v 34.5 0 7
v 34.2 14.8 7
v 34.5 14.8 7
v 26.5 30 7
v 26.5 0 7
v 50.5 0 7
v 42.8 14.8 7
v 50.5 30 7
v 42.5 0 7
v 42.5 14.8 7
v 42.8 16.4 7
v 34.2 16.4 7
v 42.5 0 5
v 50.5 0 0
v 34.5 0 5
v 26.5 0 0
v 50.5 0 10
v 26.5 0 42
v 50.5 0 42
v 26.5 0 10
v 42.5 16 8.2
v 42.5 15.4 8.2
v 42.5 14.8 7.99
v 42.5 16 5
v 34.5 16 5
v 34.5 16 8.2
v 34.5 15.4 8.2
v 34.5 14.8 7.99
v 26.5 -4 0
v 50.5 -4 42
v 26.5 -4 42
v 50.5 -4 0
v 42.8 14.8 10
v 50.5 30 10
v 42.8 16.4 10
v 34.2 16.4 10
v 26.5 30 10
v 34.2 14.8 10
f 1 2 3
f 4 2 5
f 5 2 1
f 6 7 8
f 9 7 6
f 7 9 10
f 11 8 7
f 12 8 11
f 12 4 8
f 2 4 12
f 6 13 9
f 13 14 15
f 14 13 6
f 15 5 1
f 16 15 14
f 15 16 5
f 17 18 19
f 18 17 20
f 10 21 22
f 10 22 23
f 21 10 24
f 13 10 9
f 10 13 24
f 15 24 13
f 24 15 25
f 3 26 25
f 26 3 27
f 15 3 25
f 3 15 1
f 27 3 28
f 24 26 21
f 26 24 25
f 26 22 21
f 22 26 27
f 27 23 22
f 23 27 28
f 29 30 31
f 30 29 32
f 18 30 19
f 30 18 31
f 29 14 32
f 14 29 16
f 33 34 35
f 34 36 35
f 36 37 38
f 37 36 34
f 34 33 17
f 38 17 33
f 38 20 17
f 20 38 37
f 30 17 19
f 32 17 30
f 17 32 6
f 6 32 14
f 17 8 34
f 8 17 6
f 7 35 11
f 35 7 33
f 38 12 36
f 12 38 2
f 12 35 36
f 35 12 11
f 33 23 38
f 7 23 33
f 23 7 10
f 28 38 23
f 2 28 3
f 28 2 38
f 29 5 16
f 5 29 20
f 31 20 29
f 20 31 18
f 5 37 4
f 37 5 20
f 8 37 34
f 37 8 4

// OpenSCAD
// Lab Rax generic equipment tray + faceplate (wizard template).
// Faceplate derived from the Pi4 baseline; rack holes follow the four-corner layout of the user-supplied
// 1U blank plate (faceplate_mounting.json): EVERY rack unit gets 4 holes, never a single centre pair.
// The wizard appends override assignments at the end of this file.
// PROPOSED, UNVALIDATED: printed fit, strength and rack clearance are UNKNOWN.
$fn=48;
part="assembly";            // assembly, faceplate, tray, combined, rear_bracket
// Device envelope (mm). Origin of hole coordinates = device front-left corner, seen from above.
dev_w=85; dev_d=56; dev_h=20;
holes=[];                   // [[x,y],...] mounting hole centres
hole_d=2.7;                 // device mounting hole diameter
device_mount="inserts";     // inserts, pegs, clips, straps
standoff=6;                 // device lift above tray floor
insert_pilot=3.2;           // pilot for heat-set insert (inserts mode)
board_t=1.6;                // board/flange thickness (pegs, clips)
joint="screw";              // screw, snap, single
u=1;                        // faceplate height in rack units
keystones=[];               // [x,...] keystone centres on faceplate (X=0 centre)
ks_w=14.5; ks_h=16;         // standard keystone opening
ports=[];                   // [[x,z,w,h,r],...] faceplate cut-outs, z from plate bottom, r=corner radius
front_gap=12;               // device front to faceplate rear face
margin=8;                   // tray border around device
rear_support=false;         // heavy/deep equipment: tray runs to the rear posts and screws to a rear bracket
coupon=[];                  // test coupon: [x0,x1,ymax] keeps only that slice of the part

// 4 mm plate (owner default 2026-10-18). Corner radius is limited by the four-corner holes:
// the reference holes sit 1.6 mm from the top/bottom edge, so larger corners would cut into them.
plate_w=252; plate_t=4; plate_r=2.5; plate_h=u*44.45-2.45;
hole_x=118.2625; hole_dz=15.902;   // each U: holes at its centre ±hole_dz (5.098 / 36.902 on a 1U plate)
rack_depth=240;             // Lab Rax frame depth (front of front posts to back of rear posts)
nudge=0;                    // render-repair only: tiny size offset applied when OpenSCAD 2021 emits a sliver
ks_front=2;                 // keystone clips need a thin wall: plate is pocketed from behind down to this
tray_t=3; tray_z=7;
tray_w=dev_w+2*margin; tray_d=rear_support?rack_depth:dev_d+front_gap+margin;
tray_x=-tray_w/2; tray_y=0;
dev_x=-dev_w/2; dev_y=front_gap; floor_top=tray_z+tray_t;
jx=min(40,tray_w/2-12); joint_x=[-jx,jx];
tongue_w=12; tongue_depth=7; tongue_h=3; tongue_z=tray_z+3.5;
slot_clear=0.3; boss_d=9; m3_clear=3.4; joint_pilot=4.0;  // 4.0 = the printed, well-fitting Pi4 trial

module capsule2d(len=10,diam=7){hull(){translate([-(len-diam)/2,0])circle(d=diam);translate([(len-diam)/2,0])circle(d=diam);}}
module rrect(w,h,r){rr=min(r,w/2-0.01,h/2-0.01);if(rr<=0)square([w,h],center=true);else offset(r=rr)square([w-2*rr,h-2*rr],center=true);}
// Mirror front-of-tray features to the rear (about the rack's mid-depth).
module to_rear(){translate([0,rack_depth/2,0])mirror([0,1,0])translate([0,-rack_depth/2,0])children();}

// Faceplate outline seen from the front: 2D X = rack X, 2D Y = height Z.
// rear=true cuts the larger keystone pocket; plain=true leaves out keystones/ports (rear bracket).
module plate2d(rear=false,plain=false){
 difference(){
  hull()for(sx=[-1,1],sz=[-1,1])translate([sx*(plate_w/2-plate_r),plate_h/2+sz*(plate_h/2-plate_r)])circle(r=plate_r+nudge);
  for(i=[0:u-1],dz=[-hole_dz,hole_dz],x=[-hole_x,hole_x])translate([x,i*44.45+21+dz])capsule2d();
  if(!plain){
   for(x=keystones)if(rear)translate([x,plate_h/2])square([ks_w+4+nudge,ks_h+6+nudge],center=true);
                   else translate([x,plate_h/2])square([ks_w,ks_h],center=true);
   for(p=ports)translate([p[0],p[1]])rrect(p[2],p[3],p[4]);
  }
 }
}
// Plate between y=y0 (front) and y0+t, built from the 2D outline (cleaner meshes than 3D cuts in OpenSCAD 2021).
module plate_layer(y0,t,rear=false,plain=false){translate([0,y0+t,0])rotate([90,0,0])linear_extrude(height=t)plate2d(rear,plain);}

module plate_joint_add(){
 if(joint=="screw"){
  for(x=joint_x)translate([x-tongue_w/2,0,tongue_z])cube([tongue_w,tongue_depth,tongue_h]);
  for(x=joint_x)translate([x,0,tray_z+14])rotate([-90,0,0])cylinder(d=boss_d,h=8);
 }
 if(joint=="snap") for(x=joint_x){
  // Cantilever arm under the tray floor; barb snaps up into a floor window.
  translate([x-4,0,tray_z-2])cube([8,16,2]);
  translate([x-4,12,tray_z])hull(){cube([8,4,0.01]);translate([0,3.4,0])cube([8,0.6,1.2]);}
 }
}
module plate_joint_cut(){if(joint=="screw")for(x=joint_x)translate([x,-0.1,tray_z+14])rotate([-90,0,0])cylinder(d=joint_pilot,h=8.2);}

module faceplate(){
 difference(){
  union(){
   // Front layer keeps the keystone opening; with keystones, the rear layer is pocketed so jacks grip ks_front.
   if(len(keystones)>0&&plate_t>ks_front){plate_layer(-plate_t,ks_front);plate_layer(-plate_t+ks_front,plate_t-ks_front,true);}
   else plate_layer(-plate_t,plate_t);
   plate_joint_add();
  }
  plate_joint_cut();
 }
}
// Plain plate on the rear posts (mirror of the faceplate, no openings) that the tray's rear end screws/snaps to.
module rear_bracket(){to_rear()difference(){union(){plate_layer(-plate_t,plate_t,false,true);plate_joint_add();}plate_joint_cut();}}

module device_features_add(){
 if(device_mount=="inserts")for(h=holes)translate([dev_x+h[0],dev_y+h[1],floor_top])cylinder(d=max(insert_pilot+3.5,7),h=standoff);
 if(device_mount=="pegs")for(h=holes)translate([dev_x+h[0],dev_y+h[1],floor_top]){
  cylinder(d=hole_d+3,h=standoff);
  translate([0,0,standoff])cylinder(d=hole_d-0.3,h=board_t+0.8);
  translate([0,0,standoff+board_t+0.8])cylinder(d1=hole_d-0.3,d2=hole_d-1,h=0.8);
 }
 if(device_mount=="clips"){
  // Support ledges at the four corners plus a flexing clip on each side.
  for(x=[dev_x-1,dev_x+dev_w-5],y=[dev_y-1,dev_y+dev_d-5])translate([x,y,floor_top])cube([6,6,standoff]);
  for(s=[-1,1])translate([s>0?dev_x+dev_w+0.2:dev_x-2.2,dev_y+dev_d/2-5,floor_top]){
   cube([2,10,standoff+board_t+2.5]);
   translate([s>0?-1.2:2,0,standoff+board_t+0.2])hull(){cube([1.2,10,1.6]);translate([s>0?1.2:0,0,1.6])cube([0.01,10,0.6]);}
  }
 }
}
module device_features_cut(){
 if(device_mount=="inserts")for(h=holes)translate([dev_x+h[0],dev_y+h[1],floor_top+0.01])cylinder(d=insert_pilot,h=standoff+0.1);
 if(device_mount=="straps")for(x=[dev_x-5.5,dev_x+dev_w+2.5],y=[dev_y+dev_d*0.25,dev_y+dev_d*0.75])
  translate([x,y-6,tray_z-0.1])cube([3,12,tray_t+0.2]);
}

module tray_joint_add(){
 if(joint=="screw"){
  for(x=joint_x) translate([x-9,0,tray_z+tray_t])cube([18,8,5]);
  for(x=joint_x)translate([x-7,8.3,tray_z+3])cube([14,3,19]);
  for(x=joint_x) for(side=[-1,1]) translate([x+side*6-1,0,0])
    hull(){translate([0,9,tray_z+2.7])cube([2,2,0.5]);
           translate([0,9,tray_z+8])cube([2,2,0.5]);
           translate([0,20,tray_z+2.7])cube([2,2,0.5]);}
 }
}
module tray_joint_cut(){
 if(joint=="screw"){
  for(x=joint_x)translate([x-(tongue_w+slot_clear)/2,-0.1,tongue_z-slot_clear/2])cube([tongue_w+slot_clear,tongue_depth+slot_clear,tongue_h+slot_clear]);
  for(x=joint_x)translate([x,11.4,tray_z+14])rotate([90,0,0])cylinder(d=m3_clear,h=12);
 }
 if(joint=="snap")for(x=joint_x)translate([x-4.3,14.8,tray_z-0.1])cube([8.6,1.6,tray_t+0.2]);
}

module tray(){
 difference(){
  union(){
   translate([tray_x,tray_y,tray_z])cube([tray_w,tray_d,tray_t]);
   tray_joint_add();
   if(rear_support)to_rear()tray_joint_add();
   device_features_add();
  }
  tray_joint_cut();
  if(rear_support)to_rear()tray_joint_cut();
  device_features_cut();
 }
}

module clip_coupon(){if(len(coupon)==3)intersection(){children();translate([coupon[0],-50,-50])cube([coupon[1]-coupon[0],coupon[2]+50,400]);}else children();}

clip_coupon(){
 if(part=="faceplate")faceplate();
 else if(part=="tray")tray();
 else if(part=="rear_bracket")rear_bracket();
 else if(part=="combined")union(){faceplate();translate([tray_x,-0.01,tray_z])cube([tray_w,0.02+0.01,tray_t]);tray();if(rear_support)rear_bracket();}
 else {color("steelblue")faceplate();color("silver")tray();if(rear_support)color("steelblue")rear_bracket();
  %translate([dev_x,dev_y,floor_top+(device_mount=="inserts"||device_mount=="pegs"||device_mount=="clips"?standoff:0)])cube([dev_w,dev_d,dev_h]);}
}

// ---- wizard overrides: 2_Snap_joint
dev_w=85.0;
dev_d=56.0;
dev_h=20.0;
hole_d=2.7;
standoff=6.0;
insert_pilot=3.2;
board_t=1.6;
u=1;
holes=[[3.5, 3.5], [61.5, 3.5], [3.5, 52.5], [61.5, 52.5]];
keystones=[];
device_mount="inserts";
joint="snap";
rear_support=false;
coupon=[26.5, 50.5, 30.0];
ports=[];
